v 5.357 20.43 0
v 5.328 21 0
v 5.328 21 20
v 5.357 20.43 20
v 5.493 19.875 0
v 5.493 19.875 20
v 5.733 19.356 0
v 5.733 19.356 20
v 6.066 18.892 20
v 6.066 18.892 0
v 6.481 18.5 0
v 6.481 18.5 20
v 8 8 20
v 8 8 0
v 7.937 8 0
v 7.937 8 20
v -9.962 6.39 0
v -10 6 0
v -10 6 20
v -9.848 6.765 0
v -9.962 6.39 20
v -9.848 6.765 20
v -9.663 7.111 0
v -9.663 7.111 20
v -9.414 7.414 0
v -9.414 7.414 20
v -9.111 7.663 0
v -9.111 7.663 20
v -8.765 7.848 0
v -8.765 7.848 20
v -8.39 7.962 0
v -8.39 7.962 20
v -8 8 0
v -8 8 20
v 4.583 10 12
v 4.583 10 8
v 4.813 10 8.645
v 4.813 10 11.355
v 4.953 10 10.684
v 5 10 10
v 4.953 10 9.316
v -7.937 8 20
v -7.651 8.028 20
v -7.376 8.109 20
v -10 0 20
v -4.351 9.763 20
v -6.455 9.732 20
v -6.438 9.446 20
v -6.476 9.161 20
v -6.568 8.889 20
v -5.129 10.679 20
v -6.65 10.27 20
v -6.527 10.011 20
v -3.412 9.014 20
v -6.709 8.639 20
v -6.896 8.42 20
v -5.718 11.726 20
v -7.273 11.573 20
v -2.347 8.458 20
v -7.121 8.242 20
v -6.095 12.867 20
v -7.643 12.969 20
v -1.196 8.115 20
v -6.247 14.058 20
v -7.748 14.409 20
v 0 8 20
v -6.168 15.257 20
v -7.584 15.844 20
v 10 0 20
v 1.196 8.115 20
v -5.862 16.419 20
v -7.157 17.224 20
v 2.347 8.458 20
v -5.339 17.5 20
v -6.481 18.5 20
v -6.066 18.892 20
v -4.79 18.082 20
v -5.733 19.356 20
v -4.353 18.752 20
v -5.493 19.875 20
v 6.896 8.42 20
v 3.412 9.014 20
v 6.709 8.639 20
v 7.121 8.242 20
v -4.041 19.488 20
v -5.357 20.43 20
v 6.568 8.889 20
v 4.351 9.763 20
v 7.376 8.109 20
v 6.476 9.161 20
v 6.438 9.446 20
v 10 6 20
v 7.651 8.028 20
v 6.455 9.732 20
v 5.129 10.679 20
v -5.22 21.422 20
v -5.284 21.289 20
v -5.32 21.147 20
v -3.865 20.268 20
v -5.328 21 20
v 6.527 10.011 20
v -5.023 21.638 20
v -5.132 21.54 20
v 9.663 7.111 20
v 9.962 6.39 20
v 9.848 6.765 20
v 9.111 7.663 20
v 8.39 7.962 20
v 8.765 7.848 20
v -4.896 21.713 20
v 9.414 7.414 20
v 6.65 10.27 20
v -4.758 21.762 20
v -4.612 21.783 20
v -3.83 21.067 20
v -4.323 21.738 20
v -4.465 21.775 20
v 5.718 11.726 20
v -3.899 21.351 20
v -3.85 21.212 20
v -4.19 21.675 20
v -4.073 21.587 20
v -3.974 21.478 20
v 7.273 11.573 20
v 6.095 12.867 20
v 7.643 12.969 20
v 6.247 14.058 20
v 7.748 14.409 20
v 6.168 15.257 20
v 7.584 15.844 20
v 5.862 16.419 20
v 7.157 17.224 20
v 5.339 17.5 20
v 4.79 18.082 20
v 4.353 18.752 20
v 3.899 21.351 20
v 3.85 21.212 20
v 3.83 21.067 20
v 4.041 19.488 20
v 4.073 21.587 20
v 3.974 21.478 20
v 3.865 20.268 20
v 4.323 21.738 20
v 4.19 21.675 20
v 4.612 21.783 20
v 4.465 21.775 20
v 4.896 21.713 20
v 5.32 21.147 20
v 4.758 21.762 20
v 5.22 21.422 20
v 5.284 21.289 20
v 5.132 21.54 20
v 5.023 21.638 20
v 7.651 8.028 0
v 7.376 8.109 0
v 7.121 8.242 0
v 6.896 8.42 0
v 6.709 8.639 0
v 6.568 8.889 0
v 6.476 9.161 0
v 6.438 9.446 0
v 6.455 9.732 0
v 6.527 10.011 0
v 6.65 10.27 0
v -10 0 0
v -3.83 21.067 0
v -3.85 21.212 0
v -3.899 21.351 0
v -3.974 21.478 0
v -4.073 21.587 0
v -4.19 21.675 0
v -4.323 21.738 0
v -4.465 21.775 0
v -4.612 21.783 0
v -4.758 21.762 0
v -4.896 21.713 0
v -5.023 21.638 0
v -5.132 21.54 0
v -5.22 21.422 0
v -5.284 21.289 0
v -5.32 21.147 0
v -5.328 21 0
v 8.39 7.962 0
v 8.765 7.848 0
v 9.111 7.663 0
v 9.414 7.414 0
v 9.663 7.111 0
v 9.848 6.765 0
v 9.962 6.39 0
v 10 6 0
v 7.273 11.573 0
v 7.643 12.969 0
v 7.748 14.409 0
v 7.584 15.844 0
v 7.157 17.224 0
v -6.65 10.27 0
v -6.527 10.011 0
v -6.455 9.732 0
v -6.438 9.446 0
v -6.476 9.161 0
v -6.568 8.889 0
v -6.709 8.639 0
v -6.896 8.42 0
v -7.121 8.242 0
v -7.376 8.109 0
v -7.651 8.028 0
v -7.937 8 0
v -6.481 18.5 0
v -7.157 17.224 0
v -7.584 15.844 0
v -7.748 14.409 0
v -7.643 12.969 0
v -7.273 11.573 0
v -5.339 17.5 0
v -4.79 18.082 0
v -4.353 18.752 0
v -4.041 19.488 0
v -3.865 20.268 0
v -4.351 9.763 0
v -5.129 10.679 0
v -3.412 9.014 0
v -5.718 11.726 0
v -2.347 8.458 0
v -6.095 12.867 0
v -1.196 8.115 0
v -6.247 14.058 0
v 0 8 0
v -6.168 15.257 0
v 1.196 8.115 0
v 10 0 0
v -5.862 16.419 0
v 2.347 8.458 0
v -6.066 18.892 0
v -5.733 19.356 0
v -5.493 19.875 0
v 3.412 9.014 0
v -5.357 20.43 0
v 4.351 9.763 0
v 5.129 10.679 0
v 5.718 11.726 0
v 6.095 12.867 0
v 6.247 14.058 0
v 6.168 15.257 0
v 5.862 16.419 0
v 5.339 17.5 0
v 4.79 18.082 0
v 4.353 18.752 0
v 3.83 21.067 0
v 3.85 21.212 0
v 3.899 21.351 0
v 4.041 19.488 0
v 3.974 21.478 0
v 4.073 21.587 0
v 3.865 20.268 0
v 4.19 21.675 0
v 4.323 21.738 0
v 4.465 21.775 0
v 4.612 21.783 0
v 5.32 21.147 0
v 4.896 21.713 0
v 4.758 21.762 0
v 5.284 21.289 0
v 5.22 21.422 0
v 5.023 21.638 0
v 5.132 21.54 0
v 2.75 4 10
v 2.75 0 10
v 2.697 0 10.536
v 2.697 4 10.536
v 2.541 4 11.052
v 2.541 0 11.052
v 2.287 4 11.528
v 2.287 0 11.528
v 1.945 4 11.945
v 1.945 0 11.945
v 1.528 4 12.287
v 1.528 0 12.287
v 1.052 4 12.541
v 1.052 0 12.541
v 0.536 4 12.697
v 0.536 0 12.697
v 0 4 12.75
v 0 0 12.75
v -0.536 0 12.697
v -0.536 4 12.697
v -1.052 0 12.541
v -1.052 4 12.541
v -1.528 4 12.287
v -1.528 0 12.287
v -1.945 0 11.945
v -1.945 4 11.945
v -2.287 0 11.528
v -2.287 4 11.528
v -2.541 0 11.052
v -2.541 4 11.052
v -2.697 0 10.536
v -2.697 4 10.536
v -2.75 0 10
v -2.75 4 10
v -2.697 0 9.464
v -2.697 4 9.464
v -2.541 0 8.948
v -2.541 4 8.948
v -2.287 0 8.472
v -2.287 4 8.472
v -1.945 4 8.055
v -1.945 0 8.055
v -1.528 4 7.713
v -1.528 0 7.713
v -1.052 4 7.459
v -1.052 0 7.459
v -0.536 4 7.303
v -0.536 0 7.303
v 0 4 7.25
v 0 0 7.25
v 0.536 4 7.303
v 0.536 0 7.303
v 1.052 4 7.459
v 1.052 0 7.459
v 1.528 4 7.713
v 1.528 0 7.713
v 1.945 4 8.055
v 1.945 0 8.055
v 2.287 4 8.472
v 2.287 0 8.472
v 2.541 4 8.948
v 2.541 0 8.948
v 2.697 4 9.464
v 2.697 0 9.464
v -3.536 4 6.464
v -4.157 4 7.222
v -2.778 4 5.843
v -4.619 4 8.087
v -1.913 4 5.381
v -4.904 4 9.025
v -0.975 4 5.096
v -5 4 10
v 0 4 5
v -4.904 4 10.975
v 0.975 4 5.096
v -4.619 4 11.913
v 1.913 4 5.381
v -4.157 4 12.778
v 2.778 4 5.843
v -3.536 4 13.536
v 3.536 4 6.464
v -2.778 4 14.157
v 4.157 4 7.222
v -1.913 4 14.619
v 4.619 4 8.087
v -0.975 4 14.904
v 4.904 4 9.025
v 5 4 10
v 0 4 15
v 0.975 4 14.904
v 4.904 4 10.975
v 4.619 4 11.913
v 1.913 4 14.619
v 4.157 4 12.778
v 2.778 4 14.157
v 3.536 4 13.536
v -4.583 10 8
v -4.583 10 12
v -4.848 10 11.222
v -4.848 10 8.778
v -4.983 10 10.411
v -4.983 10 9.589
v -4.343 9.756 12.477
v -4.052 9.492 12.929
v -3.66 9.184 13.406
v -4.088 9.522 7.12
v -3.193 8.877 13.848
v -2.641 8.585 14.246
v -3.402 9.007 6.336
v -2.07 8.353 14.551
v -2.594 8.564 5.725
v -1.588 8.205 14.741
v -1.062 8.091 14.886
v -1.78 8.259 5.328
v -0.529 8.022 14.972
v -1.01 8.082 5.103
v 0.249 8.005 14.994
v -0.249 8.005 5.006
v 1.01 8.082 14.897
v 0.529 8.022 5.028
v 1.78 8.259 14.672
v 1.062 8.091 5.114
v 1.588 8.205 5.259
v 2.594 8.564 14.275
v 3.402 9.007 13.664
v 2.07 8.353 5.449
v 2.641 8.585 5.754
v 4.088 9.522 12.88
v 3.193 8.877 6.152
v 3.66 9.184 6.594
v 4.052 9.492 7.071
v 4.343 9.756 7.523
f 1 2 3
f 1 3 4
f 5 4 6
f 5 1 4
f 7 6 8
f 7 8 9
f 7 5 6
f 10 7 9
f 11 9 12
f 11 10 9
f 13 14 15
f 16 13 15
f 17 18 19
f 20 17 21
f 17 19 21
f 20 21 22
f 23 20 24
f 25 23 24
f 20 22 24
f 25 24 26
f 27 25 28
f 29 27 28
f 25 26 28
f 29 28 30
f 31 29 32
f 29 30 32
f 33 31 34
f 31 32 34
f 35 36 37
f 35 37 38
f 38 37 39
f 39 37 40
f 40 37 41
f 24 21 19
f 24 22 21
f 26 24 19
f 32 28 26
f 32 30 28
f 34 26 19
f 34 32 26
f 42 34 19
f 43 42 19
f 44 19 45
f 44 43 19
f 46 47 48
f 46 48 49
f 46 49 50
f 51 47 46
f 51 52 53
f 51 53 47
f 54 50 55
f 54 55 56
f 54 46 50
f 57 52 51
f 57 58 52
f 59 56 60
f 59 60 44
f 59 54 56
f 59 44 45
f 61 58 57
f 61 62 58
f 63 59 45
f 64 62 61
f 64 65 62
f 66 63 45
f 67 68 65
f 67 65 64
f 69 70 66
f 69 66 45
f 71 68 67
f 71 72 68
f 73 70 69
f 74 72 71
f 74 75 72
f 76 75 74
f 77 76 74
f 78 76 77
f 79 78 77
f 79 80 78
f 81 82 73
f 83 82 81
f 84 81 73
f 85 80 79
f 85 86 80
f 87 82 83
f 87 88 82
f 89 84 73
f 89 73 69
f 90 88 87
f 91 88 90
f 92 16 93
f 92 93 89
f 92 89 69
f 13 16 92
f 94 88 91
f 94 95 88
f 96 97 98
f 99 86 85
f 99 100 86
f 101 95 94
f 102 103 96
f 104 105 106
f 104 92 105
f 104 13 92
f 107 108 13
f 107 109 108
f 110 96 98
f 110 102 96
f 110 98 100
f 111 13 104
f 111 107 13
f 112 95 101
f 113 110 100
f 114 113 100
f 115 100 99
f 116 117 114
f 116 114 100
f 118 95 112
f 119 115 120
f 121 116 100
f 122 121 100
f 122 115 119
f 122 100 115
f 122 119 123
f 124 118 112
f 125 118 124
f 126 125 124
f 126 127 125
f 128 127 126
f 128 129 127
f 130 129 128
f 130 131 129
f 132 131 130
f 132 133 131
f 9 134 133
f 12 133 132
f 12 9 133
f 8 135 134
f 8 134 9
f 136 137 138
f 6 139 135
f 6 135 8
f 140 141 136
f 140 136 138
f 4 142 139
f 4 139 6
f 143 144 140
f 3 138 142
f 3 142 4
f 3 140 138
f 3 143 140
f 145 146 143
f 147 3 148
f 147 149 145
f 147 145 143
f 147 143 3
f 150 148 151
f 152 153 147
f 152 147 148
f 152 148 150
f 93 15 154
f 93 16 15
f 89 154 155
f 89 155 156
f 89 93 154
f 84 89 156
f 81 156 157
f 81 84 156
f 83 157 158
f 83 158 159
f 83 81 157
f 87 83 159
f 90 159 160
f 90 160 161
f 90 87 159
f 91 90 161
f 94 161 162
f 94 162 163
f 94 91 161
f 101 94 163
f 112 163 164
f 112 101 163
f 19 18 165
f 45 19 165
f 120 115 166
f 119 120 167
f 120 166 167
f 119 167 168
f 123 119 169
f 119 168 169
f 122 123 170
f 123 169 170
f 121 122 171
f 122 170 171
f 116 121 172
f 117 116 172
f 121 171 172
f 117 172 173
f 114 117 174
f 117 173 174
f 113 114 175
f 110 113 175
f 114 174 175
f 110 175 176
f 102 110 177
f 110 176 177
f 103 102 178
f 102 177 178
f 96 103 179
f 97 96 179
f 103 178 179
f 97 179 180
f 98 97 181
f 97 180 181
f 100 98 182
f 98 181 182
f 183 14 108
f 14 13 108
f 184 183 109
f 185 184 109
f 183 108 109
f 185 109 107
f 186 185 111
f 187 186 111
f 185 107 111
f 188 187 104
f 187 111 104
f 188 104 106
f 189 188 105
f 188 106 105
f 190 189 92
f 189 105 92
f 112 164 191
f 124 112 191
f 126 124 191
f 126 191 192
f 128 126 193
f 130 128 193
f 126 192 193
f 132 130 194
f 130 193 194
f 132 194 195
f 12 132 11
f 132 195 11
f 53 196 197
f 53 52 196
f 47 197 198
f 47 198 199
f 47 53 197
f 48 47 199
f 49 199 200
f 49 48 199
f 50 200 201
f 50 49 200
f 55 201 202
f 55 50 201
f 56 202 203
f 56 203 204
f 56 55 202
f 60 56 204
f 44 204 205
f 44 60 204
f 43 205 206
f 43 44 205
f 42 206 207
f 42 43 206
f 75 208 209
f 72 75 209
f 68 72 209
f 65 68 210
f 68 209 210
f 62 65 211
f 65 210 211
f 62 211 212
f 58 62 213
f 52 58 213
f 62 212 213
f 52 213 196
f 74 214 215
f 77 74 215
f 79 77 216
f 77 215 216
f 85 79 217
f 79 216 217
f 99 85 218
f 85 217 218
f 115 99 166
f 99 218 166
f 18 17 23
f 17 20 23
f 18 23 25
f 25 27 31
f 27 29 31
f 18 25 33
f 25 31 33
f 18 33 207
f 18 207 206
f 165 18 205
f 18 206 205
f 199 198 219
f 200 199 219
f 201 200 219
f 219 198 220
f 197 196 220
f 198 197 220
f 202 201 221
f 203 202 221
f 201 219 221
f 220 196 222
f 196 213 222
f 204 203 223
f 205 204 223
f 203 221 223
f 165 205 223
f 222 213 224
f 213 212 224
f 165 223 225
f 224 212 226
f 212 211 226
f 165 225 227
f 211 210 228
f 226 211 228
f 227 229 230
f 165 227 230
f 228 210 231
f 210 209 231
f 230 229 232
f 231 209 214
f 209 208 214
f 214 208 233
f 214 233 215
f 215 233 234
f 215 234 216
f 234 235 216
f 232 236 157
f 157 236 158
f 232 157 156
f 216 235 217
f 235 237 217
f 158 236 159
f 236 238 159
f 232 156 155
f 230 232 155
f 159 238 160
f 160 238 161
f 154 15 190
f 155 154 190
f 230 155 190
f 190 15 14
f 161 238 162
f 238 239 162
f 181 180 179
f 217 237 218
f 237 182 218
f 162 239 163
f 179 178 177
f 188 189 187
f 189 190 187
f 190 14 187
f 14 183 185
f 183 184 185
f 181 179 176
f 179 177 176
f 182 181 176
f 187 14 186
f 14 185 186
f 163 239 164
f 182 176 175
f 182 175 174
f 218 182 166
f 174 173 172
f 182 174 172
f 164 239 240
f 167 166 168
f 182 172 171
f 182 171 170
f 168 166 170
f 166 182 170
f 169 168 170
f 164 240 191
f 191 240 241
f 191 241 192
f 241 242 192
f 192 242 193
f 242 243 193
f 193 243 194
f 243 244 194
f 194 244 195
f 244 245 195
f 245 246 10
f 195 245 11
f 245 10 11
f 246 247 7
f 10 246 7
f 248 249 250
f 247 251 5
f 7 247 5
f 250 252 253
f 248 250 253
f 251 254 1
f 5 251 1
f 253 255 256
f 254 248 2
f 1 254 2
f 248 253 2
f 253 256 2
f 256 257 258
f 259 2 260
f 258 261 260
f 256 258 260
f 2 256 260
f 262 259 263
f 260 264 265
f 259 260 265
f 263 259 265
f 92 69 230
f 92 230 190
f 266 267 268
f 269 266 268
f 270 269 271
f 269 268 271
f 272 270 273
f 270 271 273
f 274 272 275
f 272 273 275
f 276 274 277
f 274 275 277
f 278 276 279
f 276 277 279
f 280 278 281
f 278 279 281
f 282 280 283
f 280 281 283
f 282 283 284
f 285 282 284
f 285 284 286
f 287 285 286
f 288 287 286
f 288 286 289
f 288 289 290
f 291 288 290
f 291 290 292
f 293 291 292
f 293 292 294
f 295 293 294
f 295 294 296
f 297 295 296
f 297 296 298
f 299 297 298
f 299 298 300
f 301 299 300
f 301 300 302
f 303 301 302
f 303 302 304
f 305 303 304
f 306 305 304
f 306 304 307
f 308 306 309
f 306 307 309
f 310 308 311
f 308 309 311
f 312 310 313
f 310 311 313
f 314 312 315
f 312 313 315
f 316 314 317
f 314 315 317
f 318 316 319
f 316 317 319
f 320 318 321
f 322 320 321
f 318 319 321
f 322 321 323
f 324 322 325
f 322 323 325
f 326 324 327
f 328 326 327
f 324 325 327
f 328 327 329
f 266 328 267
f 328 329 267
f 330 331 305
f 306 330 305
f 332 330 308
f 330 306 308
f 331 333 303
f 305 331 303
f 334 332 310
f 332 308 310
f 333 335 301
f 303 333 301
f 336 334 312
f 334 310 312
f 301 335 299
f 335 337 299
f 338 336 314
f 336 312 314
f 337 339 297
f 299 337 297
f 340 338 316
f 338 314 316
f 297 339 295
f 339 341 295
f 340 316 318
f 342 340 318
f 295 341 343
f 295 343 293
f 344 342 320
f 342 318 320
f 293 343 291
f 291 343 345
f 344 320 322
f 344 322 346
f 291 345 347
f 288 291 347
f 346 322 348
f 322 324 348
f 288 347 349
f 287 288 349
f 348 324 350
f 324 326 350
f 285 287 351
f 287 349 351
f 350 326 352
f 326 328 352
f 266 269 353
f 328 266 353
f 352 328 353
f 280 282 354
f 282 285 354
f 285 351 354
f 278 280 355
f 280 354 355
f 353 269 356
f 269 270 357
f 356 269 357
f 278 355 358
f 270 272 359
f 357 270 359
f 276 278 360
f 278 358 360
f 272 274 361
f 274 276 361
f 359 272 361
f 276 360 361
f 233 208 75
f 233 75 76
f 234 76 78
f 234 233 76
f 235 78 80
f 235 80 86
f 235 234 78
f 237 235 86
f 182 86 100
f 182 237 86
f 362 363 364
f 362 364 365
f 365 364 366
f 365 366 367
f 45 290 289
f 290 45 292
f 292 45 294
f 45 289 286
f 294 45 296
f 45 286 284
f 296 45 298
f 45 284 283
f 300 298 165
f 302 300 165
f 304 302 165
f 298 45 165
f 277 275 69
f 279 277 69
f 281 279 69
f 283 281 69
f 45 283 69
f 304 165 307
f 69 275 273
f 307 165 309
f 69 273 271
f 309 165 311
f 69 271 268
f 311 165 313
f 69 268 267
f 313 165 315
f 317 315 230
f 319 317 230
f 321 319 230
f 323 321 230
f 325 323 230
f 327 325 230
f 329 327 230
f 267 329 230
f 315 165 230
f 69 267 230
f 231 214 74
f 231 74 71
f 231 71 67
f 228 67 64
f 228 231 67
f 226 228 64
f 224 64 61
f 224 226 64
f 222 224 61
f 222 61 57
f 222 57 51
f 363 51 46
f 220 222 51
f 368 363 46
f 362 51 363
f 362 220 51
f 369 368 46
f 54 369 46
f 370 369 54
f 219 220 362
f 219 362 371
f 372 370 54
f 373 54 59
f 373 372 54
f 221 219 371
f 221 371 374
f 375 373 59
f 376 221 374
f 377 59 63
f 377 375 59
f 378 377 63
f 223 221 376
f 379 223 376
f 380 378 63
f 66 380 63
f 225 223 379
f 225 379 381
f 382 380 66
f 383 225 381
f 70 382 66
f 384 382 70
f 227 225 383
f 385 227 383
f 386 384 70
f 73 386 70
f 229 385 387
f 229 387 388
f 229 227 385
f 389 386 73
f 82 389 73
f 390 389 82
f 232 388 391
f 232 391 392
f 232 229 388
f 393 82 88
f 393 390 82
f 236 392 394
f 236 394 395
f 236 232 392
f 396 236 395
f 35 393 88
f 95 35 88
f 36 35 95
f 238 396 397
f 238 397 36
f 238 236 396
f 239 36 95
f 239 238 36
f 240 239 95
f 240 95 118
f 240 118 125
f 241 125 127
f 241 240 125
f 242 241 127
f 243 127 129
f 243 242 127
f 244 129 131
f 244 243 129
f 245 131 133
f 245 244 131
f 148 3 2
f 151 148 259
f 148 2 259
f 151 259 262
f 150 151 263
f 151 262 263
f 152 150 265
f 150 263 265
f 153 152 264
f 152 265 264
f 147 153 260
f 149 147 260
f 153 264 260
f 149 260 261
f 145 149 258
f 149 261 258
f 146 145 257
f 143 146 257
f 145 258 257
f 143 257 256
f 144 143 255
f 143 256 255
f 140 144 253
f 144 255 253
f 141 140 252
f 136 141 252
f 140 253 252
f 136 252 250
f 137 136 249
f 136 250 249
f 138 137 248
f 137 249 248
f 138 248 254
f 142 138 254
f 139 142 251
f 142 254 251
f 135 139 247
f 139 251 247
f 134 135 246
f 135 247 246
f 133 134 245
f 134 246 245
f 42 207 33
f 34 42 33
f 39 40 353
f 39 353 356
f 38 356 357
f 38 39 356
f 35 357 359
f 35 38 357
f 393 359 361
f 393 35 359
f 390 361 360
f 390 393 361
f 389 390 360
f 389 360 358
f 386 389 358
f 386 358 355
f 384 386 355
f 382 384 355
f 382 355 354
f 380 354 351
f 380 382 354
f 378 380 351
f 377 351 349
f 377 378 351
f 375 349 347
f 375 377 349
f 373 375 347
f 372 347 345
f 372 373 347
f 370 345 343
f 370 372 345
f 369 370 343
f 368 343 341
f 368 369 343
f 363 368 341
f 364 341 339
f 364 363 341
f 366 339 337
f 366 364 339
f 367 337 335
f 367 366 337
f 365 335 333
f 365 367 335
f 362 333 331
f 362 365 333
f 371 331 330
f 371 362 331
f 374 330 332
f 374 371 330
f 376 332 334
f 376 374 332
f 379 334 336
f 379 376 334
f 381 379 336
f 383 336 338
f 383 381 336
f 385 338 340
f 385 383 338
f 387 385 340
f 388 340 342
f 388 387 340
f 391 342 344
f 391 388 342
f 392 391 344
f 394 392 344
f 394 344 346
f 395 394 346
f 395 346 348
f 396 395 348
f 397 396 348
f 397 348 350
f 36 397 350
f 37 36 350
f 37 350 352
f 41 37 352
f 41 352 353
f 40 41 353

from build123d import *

# Parameters (mm, degrees)
PAD_DEPTH       = 20
FILLET_R        = 1.5
FILLET001_R     = 2
SKETCH001_R     = 2.75
POCKET_DEPTH    = 21.784467
SKETCH002_R     = 5
POCKET001_DEPTH = 6


with BuildPart() as part:
    # Sketch → Pad (new body)
    with BuildSketch(Plane.XY):
        with BuildLine():
            Line((-10, 0), (10, 0))
            Line((10, 0), (10, 8))
            Line((10, 8), (4.582576, 8))
            ThreePointArc((4.582576, 8), (7.626385, 12.87132), (6.480741, 18.5))
            ThreePointArc((5.328024, 21), (5.60069, 19.609971), (6.480741, 18.5))
            ThreePointArc((5.328024, 21), (4.612239, 21.78272), (3.829519, 21.066935))
            ThreePointArc((3.829519, 21.066935), (4.180655, 19.112817), (5.338539, 17.5))
            ThreePointArc((-5.338539, 17.5), (0, 8), (5.338539, 17.5))
            ThreePointArc((-5.338539, 17.5), (-4.180655, 19.112817), (-3.829519, 21.066935))
            ThreePointArc((-3.829519, 21.066935), (-4.612239, 21.78272), (-5.328024, 21))
            ThreePointArc((-6.480741, 18.5), (-5.60069, 19.609971), (-5.328024, 21))
            ThreePointArc((-6.480741, 18.5), (-7.626385, 12.87132), (-4.582576, 8))
            Line((-4.582576, 8), (-10, 8))
            Line((-10, 8), (-10, 0))
        make_face()
    extrude(amount=PAD_DEPTH)

    # Fillet
    fillet_edges = [part.edges().sort_by_distance(p)[0] for p in [
        (4.582576, 8, 10),
        (-4.582576, 8, 10),
    ]]
    fillet(fillet_edges, radius=FILLET_R)

    # Fillet001
    fillet001_edges = [part.edges().sort_by_distance(p)[0] for p in [
        (10, 8, 10),
        (-10, 8, 10),
    ]]
    fillet(fillet001_edges, radius=FILLET001_R)

    # Sketch001 (on Face7 of Fillet001) → Pocket (cut, through all)
    with BuildSketch(Plane.XZ):
        with Locations((0, 10)):
            Circle(SKETCH001_R)
    extrude(amount=-POCKET_DEPTH, mode=Mode.SUBTRACT)

    # Sketch002 (on DatumPlane) → Pocket001 (cut)
    with BuildSketch(Plane.XZ.offset(-10)):
        with Locations((0, 10)):
            Circle(SKETCH002_R)
    extrude(amount=POCKET001_DEPTH, mode=Mode.SUBTRACT)


solid = part.part
